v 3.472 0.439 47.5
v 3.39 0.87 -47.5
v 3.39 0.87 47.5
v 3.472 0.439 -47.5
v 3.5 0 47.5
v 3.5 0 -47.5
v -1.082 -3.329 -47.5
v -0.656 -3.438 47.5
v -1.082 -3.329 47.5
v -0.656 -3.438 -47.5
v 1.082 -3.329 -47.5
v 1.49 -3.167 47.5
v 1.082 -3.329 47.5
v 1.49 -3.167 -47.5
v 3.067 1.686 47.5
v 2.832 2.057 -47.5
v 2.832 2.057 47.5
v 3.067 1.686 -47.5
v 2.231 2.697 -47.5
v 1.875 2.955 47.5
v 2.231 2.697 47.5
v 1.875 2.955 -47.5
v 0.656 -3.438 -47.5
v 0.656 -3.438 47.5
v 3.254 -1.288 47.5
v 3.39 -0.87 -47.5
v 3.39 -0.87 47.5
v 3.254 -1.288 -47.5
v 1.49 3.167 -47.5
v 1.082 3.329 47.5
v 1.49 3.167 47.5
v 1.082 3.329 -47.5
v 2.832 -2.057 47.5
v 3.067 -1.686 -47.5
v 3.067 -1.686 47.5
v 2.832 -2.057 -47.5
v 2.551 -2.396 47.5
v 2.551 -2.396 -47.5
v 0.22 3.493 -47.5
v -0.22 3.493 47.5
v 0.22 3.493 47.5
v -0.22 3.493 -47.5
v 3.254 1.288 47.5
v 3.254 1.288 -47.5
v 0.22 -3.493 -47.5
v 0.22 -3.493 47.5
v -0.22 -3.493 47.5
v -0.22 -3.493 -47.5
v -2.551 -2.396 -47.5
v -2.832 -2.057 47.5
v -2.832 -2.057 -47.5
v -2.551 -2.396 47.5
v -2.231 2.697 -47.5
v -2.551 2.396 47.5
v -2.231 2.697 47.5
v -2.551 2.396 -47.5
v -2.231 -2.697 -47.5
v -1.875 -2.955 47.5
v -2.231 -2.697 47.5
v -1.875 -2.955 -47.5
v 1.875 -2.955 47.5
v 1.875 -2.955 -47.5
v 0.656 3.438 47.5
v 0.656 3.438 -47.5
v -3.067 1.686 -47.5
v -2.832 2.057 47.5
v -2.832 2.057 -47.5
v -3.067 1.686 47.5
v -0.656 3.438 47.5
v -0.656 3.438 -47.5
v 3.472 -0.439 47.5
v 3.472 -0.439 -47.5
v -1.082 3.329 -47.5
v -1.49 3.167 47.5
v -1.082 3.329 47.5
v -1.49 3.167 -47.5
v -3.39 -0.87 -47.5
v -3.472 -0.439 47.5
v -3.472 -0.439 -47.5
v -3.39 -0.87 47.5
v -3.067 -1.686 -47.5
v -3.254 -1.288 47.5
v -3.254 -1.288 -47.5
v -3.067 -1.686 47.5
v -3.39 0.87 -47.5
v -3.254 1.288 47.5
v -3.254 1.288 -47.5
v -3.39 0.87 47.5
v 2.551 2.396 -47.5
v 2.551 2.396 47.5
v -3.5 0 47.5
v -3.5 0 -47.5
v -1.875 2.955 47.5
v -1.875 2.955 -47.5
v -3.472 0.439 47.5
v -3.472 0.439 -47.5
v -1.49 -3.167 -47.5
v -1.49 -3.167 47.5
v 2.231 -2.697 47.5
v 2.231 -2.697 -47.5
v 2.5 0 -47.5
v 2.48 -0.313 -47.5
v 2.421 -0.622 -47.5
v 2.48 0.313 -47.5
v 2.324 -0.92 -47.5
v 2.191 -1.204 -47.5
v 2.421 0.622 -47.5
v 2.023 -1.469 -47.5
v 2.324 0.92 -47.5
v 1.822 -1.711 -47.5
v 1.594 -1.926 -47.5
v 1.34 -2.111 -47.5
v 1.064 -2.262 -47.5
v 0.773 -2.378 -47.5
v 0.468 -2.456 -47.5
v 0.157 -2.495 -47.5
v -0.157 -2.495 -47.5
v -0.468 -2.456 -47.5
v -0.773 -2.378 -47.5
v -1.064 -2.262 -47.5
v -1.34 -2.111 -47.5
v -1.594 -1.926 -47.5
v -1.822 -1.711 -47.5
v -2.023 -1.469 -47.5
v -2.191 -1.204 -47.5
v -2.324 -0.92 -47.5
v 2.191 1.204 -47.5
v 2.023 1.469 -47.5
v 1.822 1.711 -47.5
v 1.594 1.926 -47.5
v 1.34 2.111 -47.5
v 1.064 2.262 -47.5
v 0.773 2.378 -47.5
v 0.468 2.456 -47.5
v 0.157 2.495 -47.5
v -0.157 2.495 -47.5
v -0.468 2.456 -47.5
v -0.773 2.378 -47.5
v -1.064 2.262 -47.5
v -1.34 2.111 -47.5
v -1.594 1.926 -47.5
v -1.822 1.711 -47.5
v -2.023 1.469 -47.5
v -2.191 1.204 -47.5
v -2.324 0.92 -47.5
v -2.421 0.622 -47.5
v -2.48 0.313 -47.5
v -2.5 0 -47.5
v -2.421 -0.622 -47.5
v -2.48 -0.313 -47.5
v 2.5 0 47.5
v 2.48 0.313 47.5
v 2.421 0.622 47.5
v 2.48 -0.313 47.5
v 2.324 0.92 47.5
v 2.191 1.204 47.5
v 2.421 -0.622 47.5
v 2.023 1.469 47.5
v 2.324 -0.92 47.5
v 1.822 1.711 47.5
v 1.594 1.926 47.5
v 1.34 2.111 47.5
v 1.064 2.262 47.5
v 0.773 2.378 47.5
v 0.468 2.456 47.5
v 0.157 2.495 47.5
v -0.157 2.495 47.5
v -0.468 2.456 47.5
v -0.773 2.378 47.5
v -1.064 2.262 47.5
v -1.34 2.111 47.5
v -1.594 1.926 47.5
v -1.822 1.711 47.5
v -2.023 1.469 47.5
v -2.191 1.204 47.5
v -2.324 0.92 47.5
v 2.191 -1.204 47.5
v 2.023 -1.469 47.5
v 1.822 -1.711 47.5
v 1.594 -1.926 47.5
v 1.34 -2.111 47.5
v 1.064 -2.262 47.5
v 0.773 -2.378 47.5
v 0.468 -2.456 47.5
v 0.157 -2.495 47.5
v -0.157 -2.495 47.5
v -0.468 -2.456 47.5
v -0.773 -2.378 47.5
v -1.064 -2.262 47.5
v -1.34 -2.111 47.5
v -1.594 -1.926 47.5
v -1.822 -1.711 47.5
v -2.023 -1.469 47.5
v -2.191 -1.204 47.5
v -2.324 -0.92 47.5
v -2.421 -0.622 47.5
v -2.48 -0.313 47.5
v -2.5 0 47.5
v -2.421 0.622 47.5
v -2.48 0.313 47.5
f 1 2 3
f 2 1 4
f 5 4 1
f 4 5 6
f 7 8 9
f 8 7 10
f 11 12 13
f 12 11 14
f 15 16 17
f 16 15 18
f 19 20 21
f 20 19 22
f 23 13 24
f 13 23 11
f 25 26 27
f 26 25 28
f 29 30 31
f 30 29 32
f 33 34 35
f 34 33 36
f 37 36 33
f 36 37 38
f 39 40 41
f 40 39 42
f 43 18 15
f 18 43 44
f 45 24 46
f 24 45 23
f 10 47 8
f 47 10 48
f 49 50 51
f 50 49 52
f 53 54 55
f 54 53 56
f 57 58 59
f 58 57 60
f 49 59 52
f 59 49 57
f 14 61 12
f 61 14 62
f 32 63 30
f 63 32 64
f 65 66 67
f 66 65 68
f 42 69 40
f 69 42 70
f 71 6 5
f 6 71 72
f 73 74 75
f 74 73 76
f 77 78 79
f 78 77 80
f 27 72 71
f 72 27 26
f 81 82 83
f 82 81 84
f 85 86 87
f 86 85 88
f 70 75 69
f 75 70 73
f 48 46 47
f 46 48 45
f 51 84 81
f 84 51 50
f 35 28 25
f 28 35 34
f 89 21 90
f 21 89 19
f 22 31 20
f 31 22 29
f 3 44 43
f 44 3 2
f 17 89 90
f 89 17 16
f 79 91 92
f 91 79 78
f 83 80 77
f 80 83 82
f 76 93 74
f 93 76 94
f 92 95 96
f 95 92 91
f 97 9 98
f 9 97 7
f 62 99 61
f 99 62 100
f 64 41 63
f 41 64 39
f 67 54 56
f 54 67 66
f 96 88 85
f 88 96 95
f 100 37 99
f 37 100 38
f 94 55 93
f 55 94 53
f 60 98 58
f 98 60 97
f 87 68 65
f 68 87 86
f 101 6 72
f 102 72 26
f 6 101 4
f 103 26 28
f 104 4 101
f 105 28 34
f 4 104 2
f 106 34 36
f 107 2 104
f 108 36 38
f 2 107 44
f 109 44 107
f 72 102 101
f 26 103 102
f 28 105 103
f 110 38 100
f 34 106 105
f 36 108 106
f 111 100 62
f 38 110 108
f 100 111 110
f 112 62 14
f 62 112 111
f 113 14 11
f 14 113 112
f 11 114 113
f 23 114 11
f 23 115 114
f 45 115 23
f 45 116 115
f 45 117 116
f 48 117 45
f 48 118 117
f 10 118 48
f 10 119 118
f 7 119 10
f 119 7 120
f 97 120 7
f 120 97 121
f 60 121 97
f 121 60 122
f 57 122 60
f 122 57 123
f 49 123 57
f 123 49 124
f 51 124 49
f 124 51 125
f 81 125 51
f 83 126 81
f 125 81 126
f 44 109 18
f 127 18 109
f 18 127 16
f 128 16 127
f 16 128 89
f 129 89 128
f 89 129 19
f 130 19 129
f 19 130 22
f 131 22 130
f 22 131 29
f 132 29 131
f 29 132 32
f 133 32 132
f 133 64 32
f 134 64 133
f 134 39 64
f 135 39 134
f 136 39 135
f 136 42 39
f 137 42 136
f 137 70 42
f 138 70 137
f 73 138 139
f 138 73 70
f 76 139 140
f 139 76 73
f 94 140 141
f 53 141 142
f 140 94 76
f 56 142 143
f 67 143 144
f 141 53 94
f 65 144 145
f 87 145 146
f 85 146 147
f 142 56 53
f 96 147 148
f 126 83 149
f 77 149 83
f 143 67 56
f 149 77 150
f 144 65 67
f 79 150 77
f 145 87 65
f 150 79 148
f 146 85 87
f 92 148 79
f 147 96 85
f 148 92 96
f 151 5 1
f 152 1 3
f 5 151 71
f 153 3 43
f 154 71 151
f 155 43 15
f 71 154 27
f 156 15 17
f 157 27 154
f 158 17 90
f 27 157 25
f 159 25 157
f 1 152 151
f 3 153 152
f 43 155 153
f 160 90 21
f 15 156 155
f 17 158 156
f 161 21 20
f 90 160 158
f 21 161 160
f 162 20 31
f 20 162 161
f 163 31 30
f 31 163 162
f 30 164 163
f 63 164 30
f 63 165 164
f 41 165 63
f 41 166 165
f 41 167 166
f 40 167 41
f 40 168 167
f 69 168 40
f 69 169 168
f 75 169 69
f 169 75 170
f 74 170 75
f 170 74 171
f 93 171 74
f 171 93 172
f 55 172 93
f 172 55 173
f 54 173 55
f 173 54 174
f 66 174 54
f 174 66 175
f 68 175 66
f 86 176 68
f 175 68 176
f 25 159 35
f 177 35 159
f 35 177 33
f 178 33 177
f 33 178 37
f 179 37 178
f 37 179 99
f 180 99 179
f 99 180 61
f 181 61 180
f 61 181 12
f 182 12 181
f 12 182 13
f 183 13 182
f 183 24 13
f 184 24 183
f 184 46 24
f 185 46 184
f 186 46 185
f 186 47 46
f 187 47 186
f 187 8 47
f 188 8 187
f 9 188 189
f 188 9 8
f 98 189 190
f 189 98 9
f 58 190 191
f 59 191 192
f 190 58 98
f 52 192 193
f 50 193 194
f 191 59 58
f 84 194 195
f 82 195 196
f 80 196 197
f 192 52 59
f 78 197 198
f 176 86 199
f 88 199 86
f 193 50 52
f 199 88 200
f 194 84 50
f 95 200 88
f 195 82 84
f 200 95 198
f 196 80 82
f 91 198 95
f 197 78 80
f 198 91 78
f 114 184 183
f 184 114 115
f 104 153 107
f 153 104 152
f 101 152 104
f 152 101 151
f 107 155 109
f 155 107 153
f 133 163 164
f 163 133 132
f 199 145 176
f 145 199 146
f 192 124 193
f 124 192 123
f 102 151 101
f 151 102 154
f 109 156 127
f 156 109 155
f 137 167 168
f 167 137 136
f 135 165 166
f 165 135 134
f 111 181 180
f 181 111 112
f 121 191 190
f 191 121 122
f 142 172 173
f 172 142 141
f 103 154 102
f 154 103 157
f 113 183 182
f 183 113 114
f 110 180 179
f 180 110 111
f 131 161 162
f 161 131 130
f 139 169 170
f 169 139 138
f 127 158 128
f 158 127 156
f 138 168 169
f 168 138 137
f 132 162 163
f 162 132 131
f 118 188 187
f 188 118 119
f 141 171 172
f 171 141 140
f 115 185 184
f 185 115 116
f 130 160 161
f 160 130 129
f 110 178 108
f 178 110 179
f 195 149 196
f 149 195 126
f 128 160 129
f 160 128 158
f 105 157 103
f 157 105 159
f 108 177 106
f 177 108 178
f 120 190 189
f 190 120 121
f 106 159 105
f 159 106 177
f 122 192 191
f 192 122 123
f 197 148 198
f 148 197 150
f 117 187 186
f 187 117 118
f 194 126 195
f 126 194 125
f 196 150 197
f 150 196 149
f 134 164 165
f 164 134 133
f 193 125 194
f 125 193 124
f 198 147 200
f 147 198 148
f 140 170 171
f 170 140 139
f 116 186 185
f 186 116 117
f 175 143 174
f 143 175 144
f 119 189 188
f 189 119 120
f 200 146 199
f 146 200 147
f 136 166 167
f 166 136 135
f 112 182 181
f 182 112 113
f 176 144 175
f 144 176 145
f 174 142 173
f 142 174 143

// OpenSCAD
$fn = 50;


difference() {
	union() {
		translate(v = [0, 0, -47.5000000000]) {
			cylinder(h = 95, r = 3.5000000000);
		}
	}
	union() {
		translate(v = [0, 0, -100.0000000000]) {
			cylinder(h = 200, r = 2.5000000000);
		}
	}
}
